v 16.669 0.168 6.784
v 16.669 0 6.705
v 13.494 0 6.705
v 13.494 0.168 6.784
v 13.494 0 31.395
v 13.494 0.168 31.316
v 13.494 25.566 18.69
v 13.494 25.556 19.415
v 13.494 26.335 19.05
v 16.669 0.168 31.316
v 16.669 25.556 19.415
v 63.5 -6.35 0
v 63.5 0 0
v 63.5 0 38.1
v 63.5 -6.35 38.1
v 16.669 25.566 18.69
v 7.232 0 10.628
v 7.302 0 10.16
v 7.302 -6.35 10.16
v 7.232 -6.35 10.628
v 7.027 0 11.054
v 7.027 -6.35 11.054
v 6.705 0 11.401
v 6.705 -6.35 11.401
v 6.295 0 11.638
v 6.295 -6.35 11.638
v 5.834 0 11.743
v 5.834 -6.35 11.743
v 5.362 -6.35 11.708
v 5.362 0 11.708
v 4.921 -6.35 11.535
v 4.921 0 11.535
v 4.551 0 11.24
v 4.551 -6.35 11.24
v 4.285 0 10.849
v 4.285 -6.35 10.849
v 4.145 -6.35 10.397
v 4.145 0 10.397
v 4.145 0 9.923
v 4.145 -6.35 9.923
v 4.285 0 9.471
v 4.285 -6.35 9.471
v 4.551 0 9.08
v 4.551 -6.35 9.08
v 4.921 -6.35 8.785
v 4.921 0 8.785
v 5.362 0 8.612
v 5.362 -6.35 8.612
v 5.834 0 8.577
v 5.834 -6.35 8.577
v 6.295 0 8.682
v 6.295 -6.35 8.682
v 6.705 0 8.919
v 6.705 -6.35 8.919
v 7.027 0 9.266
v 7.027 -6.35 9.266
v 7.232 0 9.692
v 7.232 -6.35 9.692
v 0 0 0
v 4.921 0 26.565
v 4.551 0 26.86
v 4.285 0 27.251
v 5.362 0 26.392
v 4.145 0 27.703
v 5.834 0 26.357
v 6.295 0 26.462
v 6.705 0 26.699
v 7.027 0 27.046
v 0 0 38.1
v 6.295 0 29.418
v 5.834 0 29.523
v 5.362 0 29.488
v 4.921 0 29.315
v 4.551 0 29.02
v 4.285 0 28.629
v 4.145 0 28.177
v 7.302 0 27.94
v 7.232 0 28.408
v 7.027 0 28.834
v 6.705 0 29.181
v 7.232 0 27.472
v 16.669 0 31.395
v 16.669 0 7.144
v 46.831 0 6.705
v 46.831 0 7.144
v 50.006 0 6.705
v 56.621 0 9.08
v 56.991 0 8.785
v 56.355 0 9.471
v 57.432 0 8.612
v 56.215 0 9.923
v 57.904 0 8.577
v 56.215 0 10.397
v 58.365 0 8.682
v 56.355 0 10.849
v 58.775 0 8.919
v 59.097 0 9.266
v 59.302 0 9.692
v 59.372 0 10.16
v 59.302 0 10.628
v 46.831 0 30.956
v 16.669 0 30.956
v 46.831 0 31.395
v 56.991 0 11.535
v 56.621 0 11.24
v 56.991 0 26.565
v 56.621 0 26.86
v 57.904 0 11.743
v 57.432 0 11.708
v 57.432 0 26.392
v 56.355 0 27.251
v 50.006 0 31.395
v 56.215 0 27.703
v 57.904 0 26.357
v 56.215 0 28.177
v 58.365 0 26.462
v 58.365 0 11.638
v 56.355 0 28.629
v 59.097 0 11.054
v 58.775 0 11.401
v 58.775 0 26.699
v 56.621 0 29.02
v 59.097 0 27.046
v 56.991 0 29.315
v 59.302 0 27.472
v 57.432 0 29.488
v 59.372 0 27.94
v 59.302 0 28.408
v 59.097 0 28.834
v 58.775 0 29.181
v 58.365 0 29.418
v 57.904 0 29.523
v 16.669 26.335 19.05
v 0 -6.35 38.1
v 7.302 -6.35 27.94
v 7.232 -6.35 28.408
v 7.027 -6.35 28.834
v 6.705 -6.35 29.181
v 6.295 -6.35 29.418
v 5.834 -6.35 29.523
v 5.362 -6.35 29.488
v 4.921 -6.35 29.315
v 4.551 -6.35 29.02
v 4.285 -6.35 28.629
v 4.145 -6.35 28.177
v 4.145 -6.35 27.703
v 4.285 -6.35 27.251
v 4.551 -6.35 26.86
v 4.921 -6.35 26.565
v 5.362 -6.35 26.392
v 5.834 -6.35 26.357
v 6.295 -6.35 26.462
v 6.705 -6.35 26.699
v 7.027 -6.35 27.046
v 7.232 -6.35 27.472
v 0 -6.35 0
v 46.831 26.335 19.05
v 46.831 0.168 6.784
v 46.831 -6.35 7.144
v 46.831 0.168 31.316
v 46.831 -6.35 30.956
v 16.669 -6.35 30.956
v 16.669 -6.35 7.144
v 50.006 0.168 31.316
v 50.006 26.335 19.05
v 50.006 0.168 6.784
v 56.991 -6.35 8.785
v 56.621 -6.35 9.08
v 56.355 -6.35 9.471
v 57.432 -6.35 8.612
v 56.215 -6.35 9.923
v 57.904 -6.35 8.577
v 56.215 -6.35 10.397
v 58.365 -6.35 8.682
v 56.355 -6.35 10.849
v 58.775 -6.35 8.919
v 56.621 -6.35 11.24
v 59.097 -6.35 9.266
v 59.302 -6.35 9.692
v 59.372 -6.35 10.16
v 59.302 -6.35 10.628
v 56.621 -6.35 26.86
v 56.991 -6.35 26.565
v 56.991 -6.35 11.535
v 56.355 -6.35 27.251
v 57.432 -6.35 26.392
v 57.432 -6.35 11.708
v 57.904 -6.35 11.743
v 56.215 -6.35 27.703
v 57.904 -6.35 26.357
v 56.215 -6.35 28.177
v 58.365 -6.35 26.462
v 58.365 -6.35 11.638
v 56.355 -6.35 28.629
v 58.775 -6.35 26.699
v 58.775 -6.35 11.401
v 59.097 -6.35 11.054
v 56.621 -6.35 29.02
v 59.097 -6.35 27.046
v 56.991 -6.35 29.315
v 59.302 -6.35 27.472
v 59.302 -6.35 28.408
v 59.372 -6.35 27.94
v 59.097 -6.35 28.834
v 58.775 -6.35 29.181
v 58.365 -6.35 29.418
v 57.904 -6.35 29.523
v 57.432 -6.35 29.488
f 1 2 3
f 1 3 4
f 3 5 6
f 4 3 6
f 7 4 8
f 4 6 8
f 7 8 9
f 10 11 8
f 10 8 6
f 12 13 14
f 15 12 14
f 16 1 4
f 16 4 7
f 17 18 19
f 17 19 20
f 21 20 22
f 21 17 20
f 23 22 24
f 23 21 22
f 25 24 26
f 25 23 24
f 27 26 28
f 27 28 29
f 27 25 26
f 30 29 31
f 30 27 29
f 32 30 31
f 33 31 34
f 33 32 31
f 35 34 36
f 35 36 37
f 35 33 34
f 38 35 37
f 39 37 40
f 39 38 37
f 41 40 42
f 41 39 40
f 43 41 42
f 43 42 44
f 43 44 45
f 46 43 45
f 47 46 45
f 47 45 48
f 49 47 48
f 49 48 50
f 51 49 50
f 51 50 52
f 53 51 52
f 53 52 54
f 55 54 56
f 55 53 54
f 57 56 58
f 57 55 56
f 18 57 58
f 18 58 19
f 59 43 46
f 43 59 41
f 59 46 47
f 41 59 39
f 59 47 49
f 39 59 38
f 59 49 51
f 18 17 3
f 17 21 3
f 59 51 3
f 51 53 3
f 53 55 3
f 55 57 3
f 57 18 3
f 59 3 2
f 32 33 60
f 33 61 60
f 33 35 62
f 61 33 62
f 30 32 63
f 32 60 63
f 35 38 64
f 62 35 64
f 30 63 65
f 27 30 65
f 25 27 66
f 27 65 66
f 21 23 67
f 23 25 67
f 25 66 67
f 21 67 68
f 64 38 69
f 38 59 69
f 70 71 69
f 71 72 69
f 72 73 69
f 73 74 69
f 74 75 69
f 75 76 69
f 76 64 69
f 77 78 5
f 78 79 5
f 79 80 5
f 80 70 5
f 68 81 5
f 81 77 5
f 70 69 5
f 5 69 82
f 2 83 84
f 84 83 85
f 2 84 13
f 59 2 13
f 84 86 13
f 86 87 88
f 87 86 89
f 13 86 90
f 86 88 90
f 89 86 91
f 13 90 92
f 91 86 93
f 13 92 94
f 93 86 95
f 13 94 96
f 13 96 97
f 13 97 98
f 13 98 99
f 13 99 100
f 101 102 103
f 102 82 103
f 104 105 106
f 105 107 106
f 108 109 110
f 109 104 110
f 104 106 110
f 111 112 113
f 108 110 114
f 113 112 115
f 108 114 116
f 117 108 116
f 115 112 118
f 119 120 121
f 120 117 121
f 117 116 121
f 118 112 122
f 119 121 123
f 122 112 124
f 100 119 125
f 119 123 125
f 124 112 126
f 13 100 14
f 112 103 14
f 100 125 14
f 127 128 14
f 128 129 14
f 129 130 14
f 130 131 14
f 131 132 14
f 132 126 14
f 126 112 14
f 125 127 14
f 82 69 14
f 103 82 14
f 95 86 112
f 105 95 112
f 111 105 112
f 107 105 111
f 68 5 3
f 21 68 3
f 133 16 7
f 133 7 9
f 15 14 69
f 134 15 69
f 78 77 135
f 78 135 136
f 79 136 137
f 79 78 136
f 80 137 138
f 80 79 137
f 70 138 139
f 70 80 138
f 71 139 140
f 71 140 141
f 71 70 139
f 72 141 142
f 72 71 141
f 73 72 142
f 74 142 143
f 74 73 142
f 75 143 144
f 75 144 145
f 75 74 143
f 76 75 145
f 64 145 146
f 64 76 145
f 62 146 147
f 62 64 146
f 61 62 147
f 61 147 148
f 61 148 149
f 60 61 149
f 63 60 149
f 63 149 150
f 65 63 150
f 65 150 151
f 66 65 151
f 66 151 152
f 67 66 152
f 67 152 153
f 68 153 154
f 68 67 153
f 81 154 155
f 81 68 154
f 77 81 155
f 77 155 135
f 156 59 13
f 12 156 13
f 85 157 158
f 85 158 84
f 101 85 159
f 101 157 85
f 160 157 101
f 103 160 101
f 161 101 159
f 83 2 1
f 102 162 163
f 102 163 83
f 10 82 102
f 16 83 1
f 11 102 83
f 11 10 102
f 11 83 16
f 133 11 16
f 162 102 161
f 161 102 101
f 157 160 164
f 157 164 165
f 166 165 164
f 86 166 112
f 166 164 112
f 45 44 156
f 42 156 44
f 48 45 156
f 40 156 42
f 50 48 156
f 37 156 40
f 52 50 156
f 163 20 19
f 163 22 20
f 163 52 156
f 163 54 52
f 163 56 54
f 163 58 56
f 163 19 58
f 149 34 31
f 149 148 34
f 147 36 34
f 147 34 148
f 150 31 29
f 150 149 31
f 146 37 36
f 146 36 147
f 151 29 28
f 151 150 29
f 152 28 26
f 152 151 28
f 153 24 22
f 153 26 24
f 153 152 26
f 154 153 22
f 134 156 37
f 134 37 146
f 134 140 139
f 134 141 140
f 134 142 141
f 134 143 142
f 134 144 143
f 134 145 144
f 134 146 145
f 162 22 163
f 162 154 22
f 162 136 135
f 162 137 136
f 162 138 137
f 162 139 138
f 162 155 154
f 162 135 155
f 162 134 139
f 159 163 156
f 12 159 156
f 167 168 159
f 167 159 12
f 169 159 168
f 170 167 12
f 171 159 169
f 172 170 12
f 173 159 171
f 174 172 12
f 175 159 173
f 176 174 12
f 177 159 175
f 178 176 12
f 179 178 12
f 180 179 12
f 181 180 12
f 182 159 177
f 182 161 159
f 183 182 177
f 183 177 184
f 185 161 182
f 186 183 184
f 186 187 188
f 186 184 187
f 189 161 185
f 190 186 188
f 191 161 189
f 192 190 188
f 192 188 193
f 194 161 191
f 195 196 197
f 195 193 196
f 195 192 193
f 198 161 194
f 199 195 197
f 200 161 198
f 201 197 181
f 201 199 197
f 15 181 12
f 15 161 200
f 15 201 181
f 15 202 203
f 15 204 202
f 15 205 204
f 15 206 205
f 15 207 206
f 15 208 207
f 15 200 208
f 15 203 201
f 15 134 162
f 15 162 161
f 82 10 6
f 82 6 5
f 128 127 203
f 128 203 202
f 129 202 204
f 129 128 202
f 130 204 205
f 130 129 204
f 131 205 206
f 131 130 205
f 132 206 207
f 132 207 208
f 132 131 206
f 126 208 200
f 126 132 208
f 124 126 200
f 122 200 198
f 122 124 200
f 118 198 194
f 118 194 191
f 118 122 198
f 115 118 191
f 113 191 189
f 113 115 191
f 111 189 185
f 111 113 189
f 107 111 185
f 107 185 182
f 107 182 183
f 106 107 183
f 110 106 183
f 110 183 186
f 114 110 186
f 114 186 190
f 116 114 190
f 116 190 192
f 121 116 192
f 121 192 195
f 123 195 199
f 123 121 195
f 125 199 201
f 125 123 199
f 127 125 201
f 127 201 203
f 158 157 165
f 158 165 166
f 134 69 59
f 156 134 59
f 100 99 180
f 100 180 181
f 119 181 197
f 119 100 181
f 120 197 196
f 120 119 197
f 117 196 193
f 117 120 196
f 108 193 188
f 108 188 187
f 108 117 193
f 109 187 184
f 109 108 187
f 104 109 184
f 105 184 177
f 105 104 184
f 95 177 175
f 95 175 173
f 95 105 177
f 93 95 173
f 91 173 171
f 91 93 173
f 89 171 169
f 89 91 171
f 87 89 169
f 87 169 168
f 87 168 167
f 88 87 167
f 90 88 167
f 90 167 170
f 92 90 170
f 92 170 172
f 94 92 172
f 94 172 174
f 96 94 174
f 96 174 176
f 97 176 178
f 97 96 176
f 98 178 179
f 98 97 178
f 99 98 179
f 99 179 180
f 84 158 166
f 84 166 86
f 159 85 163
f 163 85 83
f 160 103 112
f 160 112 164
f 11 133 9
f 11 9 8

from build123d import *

# Parameters (mm, degrees)
F0_R     = 1.5875
F1_DEPTH = 6.35
F3_DEPTH = 3.175
F5_DEPTH = 3.175


with BuildPart() as f1:
    # F0 (on Front) → F1 (new body)
    with BuildSketch(Plane.XZ):
        Polygon((0, 19.05), (0, 0), (27.627938, 0), (27.627938, 7.14375), (16.66875, 7.14375), (16.66875, 19.05), align=None)
        with Locations((5.715, 10.16)):
            Circle(F0_R, mode=Mode.SUBTRACT)
        Polygon((27.627938, 7.14375), (27.627938, 0), (63.5, 0), (63.5, 22.522444), (46.83125, 22.522444), (46.83125, 7.14375), align=None)
        with Locations((57.785, 10.16)):
            Circle(F0_R, mode=Mode.SUBTRACT)
        Polygon((0, 38.1), (0, 19.05), (16.66875, 19.05), (16.66875, 30.95625), (31.060793, 30.95625), (31.060793, 38.1), align=None)
        with Locations((5.715, 27.94)):
            Circle(F0_R, mode=Mode.SUBTRACT)
        Polygon((46.83125, 22.522444), (63.5, 22.522444), (63.5, 38.1), (31.060793, 38.1), (31.060793, 30.95625), (46.83125, 30.95625), align=None)
        with Locations((57.785, 27.94)):
            Circle(F0_R, mode=Mode.SUBTRACT)
    extrude(amount=F1_DEPTH)

    # F2 (on face) → F3 (join)
    with BuildSketch(Plane.YZ.offset(16.66875)):
        Polygon((25.556482, 19.414963), (0.168447, 31.315604), (0, 31.394564), (0, 30.95625), (0, 7.14375), (0, 6.705436), (0.168447, 6.784396), (25.566136, 18.689563), (26.335069, 19.05), align=None)
    extrude(amount=-F3_DEPTH)

    # F4 (on face) → F5 (join)
    with BuildSketch(Plane(origin=(46.83125, 0, 0), x_dir=(0, -1, 0), z_dir=(-1, 0, 0))):
        Polygon((-0.168447, 31.315604), (-26.335069, 19.05), (-0.168447, 6.784396), (0, 6.705436), (0, 31.394564), align=None)
    extrude(amount=-F5_DEPTH)


solid = f1.part
